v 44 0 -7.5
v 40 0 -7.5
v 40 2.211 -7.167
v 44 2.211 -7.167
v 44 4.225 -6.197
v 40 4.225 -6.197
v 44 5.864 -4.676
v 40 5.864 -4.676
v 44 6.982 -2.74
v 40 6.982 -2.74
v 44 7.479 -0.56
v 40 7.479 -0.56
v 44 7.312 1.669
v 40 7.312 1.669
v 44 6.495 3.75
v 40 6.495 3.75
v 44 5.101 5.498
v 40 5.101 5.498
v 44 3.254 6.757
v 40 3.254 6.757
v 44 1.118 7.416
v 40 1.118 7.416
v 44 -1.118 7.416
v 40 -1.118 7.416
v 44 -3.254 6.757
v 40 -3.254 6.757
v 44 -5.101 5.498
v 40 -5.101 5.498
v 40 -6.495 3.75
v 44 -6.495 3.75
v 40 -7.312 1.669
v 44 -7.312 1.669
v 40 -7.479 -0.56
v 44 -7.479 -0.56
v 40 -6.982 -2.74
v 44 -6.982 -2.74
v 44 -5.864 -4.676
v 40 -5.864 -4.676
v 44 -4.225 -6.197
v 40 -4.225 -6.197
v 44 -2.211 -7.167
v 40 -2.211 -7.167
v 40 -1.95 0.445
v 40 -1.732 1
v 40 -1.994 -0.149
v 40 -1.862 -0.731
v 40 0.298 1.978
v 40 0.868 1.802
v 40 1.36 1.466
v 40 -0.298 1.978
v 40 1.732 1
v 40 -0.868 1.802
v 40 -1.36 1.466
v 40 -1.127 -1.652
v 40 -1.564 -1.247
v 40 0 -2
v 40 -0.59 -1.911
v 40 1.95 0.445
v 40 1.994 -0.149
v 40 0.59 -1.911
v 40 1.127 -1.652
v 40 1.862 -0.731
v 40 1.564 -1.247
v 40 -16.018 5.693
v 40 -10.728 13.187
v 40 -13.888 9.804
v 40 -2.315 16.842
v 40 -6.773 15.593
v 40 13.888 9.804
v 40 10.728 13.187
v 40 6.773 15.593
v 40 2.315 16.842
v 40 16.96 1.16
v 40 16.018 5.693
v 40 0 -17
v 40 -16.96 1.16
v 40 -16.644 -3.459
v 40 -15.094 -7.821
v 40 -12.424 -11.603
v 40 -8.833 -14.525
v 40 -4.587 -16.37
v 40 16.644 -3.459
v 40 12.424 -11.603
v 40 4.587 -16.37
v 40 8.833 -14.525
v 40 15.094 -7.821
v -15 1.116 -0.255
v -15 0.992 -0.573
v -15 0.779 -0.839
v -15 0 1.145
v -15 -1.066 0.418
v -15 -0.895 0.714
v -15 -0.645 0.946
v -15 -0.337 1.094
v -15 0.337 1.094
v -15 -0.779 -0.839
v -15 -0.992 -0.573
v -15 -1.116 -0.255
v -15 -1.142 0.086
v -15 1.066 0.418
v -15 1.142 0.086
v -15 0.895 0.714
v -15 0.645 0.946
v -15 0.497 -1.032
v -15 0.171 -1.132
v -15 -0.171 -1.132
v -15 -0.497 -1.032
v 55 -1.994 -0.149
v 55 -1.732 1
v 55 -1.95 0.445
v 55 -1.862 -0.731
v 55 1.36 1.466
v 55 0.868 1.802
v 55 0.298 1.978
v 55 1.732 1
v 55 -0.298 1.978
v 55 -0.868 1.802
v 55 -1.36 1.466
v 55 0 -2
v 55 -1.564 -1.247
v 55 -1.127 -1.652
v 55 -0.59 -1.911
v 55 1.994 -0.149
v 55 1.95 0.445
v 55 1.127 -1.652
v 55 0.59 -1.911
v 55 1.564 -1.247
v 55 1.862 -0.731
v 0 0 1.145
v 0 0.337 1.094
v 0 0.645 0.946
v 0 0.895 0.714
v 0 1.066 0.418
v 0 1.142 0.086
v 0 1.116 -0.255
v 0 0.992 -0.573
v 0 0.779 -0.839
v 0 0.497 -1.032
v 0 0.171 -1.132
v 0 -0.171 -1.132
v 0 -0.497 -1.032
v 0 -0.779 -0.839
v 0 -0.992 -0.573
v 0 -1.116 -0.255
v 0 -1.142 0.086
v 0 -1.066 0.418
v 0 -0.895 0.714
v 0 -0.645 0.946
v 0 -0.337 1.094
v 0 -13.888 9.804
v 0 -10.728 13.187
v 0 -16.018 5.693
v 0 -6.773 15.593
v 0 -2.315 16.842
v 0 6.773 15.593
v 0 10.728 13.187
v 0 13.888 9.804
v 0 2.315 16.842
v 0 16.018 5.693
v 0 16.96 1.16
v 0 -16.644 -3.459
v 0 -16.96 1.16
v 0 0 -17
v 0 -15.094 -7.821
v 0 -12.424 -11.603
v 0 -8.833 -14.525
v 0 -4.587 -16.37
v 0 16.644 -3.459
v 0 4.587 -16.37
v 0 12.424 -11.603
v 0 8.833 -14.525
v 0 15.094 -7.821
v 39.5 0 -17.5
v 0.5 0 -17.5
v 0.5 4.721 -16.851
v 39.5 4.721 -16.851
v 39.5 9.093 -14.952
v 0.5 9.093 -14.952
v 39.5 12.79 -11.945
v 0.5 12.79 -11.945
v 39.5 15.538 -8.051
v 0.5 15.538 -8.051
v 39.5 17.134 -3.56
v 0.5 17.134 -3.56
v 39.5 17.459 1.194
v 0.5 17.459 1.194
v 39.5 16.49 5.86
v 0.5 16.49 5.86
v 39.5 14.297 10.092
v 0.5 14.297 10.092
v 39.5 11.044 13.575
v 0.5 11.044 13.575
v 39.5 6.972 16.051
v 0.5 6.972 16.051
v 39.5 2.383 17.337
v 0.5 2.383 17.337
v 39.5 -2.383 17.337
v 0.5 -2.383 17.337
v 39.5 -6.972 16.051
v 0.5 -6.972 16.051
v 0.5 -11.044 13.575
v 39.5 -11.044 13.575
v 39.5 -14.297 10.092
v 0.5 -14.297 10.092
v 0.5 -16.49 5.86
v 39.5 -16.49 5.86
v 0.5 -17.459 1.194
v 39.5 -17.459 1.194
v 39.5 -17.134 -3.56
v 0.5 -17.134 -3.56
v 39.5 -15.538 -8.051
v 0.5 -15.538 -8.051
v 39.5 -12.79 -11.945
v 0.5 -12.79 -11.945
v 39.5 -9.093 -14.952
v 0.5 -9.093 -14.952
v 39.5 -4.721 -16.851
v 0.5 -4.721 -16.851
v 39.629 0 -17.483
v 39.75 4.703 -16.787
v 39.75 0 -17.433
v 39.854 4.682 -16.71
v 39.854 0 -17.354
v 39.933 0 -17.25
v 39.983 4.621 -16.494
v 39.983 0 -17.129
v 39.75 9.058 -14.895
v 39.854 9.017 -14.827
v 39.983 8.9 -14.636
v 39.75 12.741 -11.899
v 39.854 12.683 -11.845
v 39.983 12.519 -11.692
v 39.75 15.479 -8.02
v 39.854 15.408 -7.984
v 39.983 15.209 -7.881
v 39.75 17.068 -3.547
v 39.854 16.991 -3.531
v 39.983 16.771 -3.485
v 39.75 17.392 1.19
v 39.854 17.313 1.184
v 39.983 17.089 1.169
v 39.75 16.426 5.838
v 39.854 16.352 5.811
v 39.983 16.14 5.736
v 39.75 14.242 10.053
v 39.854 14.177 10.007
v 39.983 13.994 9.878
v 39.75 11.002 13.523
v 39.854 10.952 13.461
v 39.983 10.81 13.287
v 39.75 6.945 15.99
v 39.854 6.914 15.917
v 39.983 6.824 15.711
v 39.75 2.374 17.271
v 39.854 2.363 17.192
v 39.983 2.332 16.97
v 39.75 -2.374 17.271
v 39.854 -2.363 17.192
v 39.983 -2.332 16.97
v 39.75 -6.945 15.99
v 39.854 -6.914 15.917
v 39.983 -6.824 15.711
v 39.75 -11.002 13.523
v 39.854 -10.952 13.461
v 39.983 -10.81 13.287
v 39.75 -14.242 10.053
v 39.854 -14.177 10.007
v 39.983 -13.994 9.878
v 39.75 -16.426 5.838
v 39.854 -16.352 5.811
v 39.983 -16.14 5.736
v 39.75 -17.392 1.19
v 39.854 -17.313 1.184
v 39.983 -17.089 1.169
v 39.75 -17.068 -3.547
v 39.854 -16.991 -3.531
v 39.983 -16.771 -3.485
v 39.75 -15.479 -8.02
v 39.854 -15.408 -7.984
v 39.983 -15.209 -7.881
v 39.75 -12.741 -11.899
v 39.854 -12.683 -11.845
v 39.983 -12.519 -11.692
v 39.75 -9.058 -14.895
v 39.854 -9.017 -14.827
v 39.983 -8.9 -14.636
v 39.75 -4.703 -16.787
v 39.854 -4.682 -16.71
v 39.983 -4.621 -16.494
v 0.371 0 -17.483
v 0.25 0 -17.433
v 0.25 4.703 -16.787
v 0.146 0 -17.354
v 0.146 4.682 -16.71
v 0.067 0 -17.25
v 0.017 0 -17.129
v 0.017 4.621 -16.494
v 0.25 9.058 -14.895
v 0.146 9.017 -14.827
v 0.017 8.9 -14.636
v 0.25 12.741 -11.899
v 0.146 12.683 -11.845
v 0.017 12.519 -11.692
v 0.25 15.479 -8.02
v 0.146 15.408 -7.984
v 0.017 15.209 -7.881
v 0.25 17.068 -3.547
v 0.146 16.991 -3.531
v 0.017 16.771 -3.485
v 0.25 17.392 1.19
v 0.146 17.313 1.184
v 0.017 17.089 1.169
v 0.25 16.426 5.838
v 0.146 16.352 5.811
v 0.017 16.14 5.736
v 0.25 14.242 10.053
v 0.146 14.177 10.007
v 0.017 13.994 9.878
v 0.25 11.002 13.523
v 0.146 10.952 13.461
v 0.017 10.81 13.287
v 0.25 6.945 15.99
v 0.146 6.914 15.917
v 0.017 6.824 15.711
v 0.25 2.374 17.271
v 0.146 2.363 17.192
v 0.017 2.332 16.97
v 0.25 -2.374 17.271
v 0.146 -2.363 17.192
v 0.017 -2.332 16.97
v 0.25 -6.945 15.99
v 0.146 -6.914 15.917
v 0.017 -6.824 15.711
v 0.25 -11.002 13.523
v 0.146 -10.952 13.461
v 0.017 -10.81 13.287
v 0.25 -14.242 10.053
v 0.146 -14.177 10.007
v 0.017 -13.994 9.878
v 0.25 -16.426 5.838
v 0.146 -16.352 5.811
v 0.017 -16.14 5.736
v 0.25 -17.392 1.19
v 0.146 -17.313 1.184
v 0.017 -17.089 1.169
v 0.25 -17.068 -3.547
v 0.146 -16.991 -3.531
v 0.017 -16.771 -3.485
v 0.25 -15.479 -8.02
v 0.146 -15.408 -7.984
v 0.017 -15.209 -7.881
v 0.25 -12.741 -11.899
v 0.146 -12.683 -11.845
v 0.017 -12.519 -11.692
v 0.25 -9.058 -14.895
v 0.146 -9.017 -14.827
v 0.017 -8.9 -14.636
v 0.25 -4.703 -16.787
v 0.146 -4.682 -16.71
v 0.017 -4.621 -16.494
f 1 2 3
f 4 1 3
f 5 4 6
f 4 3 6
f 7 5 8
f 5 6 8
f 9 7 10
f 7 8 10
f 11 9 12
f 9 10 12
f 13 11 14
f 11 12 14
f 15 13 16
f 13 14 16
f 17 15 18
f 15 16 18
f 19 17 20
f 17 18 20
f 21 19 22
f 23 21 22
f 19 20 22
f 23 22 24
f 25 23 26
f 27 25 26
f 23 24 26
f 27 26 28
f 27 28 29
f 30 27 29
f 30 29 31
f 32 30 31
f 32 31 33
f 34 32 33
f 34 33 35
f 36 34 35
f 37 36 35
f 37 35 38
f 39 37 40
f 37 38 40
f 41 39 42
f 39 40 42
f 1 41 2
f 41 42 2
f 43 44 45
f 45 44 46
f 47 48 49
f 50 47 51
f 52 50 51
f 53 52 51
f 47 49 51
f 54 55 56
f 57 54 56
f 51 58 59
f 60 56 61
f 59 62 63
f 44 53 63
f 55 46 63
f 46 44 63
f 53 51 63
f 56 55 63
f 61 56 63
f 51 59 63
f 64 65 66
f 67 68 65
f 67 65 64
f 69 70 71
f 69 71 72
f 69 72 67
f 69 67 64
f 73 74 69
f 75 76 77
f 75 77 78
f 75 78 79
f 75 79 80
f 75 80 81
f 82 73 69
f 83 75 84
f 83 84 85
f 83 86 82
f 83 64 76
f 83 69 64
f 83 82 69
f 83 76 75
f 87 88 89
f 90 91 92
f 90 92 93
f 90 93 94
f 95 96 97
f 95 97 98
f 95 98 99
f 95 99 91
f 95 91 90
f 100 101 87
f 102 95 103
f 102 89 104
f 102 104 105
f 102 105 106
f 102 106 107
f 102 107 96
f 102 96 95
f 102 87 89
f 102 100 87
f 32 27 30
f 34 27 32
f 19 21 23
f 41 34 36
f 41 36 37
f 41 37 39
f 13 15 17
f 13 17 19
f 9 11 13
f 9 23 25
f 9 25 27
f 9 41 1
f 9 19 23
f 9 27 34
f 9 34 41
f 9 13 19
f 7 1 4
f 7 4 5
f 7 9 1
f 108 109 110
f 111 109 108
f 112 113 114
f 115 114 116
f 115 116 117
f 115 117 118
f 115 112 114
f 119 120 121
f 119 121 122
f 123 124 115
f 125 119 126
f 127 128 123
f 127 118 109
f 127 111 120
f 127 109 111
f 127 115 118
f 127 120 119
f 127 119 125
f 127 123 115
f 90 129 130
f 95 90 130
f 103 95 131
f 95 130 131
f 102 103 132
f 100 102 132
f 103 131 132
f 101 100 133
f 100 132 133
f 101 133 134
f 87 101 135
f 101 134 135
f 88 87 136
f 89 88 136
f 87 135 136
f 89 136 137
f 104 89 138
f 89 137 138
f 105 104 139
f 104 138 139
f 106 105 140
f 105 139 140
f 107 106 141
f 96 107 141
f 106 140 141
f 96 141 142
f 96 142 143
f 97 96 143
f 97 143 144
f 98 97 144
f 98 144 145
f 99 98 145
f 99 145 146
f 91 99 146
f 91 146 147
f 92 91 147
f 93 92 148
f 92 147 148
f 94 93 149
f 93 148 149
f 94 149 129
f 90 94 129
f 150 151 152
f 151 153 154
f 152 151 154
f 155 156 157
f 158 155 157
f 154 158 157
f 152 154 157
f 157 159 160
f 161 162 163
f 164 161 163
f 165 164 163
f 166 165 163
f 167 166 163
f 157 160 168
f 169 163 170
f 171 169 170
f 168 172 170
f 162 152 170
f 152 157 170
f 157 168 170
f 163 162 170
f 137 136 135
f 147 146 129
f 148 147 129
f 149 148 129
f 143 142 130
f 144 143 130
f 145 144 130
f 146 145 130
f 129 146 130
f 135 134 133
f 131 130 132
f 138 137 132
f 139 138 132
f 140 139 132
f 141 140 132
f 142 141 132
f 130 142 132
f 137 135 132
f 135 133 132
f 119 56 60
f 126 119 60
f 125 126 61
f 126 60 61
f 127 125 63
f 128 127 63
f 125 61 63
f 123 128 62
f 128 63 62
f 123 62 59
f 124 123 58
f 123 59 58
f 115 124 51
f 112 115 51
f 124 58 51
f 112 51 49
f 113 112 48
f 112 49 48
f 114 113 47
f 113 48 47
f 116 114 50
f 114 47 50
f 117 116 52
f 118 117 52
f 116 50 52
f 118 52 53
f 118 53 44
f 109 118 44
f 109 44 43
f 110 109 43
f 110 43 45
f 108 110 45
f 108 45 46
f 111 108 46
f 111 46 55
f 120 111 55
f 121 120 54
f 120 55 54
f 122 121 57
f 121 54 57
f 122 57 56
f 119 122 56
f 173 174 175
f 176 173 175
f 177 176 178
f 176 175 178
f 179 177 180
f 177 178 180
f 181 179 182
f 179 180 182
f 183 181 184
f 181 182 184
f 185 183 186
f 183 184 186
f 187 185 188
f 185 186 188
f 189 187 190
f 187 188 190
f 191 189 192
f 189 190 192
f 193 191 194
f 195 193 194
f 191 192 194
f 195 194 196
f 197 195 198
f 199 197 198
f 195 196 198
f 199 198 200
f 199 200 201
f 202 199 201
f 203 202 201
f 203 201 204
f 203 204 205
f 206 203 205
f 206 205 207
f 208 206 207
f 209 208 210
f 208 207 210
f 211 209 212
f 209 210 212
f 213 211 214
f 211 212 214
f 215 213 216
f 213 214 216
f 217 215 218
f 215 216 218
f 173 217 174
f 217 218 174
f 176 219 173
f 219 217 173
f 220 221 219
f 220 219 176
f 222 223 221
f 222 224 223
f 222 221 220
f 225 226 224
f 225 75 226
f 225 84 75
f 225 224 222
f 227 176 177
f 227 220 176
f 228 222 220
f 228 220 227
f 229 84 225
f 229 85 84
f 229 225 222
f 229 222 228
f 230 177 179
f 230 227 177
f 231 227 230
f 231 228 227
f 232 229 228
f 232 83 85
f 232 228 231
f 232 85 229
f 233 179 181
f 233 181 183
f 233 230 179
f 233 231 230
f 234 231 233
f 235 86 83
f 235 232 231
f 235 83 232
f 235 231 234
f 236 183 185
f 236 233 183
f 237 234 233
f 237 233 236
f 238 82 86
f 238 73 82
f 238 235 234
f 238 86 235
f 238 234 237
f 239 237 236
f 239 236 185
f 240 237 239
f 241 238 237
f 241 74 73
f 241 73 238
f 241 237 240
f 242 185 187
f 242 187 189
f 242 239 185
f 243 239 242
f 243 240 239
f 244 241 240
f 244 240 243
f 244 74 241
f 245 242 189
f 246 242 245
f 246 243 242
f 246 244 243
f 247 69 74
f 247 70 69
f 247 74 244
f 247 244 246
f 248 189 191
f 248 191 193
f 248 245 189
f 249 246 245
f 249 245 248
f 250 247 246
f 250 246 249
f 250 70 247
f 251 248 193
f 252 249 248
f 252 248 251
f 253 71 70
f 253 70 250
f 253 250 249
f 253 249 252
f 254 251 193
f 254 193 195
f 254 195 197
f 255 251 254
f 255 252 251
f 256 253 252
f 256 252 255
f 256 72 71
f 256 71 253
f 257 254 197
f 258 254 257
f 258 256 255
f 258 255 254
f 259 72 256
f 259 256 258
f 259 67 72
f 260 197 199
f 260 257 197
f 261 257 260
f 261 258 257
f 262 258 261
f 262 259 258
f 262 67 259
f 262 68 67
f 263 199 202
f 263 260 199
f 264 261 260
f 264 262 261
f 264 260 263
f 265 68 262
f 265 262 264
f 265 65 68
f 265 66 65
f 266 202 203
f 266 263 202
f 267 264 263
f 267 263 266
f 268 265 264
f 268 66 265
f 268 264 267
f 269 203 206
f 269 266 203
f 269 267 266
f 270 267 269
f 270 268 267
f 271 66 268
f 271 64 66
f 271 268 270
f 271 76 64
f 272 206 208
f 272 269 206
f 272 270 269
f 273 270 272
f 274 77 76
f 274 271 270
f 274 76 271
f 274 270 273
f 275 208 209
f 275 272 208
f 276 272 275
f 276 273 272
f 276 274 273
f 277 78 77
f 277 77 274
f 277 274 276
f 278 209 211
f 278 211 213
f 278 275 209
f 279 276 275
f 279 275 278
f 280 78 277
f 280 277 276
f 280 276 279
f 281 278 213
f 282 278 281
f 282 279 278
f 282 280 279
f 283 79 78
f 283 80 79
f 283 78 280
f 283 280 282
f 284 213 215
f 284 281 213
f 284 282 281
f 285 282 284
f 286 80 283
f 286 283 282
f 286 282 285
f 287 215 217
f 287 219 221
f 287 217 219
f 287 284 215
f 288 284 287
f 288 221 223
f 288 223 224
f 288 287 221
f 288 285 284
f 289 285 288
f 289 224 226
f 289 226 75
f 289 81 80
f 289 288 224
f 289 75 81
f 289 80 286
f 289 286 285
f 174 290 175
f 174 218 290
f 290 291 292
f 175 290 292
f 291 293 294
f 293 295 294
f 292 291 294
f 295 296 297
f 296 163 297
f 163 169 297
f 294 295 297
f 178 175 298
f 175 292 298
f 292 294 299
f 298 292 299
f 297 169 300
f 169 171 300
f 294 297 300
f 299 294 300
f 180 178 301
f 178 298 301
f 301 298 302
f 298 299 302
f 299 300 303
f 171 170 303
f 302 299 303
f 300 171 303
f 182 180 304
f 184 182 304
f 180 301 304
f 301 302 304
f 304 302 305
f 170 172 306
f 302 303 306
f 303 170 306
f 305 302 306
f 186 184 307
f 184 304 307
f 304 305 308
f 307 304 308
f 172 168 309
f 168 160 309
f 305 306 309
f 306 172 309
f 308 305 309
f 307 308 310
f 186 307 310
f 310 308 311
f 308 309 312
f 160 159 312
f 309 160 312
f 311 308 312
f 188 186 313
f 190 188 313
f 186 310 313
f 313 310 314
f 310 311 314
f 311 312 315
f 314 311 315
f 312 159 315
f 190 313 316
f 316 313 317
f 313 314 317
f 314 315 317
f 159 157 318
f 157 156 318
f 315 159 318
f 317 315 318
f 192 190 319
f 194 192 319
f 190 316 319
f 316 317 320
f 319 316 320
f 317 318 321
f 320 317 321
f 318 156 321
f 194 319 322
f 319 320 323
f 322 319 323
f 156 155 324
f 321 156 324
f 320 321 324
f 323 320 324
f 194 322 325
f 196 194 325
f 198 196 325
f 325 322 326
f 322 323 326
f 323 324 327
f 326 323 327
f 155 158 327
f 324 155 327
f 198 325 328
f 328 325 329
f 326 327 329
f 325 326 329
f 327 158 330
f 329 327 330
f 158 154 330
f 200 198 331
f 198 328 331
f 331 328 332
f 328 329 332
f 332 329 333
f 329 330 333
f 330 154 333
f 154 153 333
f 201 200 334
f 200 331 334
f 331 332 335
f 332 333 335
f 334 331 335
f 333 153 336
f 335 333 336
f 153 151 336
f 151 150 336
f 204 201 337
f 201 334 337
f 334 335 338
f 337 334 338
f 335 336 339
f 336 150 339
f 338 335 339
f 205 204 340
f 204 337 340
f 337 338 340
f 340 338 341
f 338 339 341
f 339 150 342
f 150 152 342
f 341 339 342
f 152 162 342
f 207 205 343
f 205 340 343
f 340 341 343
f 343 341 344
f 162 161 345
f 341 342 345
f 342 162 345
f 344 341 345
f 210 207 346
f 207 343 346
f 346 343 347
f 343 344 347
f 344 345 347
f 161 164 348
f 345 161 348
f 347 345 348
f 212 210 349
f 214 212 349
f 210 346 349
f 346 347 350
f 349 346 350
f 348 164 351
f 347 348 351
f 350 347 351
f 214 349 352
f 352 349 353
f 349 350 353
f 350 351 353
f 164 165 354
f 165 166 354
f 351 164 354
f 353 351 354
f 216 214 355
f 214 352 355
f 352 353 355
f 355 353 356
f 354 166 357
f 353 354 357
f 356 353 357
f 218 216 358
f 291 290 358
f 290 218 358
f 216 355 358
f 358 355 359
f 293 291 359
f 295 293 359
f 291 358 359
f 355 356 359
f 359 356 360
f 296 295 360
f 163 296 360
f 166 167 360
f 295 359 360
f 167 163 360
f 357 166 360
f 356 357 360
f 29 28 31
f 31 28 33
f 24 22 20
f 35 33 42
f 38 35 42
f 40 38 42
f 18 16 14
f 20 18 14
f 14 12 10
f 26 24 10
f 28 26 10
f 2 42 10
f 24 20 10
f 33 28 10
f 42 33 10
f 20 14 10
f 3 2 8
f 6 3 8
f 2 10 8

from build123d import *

# Parameters (mm, degrees)
CROQUIS1_R              = 17.5
SALIENTE_EXTRUIR1_DEPTH = 40
CROQUIS3_R              = 2
SALIENTE_EXTRUIR2_DEPTH = 15
CROQUIS4_R              = 7.5
SALIENTE_EXTRUIR3_DEPTH = 4
CROQUIS5_R              = 1.145
SALIENTE_EXTRUIR4_DEPTH = 15
REDONDEO1_R             = 0.5
REDONDEO2_R             = 0.5


with BuildPart() as part:
    # Croquis1 → Saliente-Extruir1 (new body)
    with BuildSketch(Plane(origin=(0, 0, 0), x_dir=(0, 0, -1), z_dir=(1, 0, 0))):
        Circle(CROQUIS1_R)
    extrude(amount=SALIENTE_EXTRUIR1_DEPTH)

    # Redondeo1
    redondeo1_edges = [part.edges().sort_by_distance(p)[0] for p in [
        (0, 0, 17.5),
    ]]
    fillet(redondeo1_edges, radius=REDONDEO1_R)

    # Redondeo2
    redondeo2_edges = [part.edges().sort_by_distance(p)[0] for p in [
        (40, 0, 17.5),
    ]]
    fillet(redondeo2_edges, radius=REDONDEO2_R)


with BuildPart() as body_2:
    # Croquis3 → Saliente-Extruir2 (new body)
    with BuildSketch(Plane(origin=(40, 0, 0), x_dir=(0, 0, -1), z_dir=(1, 0, 0))):
        Circle(CROQUIS3_R)
    extrude(amount=SALIENTE_EXTRUIR2_DEPTH)


with BuildPart() as body_3:
    # Croquis4 → Saliente-Extruir3 (new body)
    with BuildSketch(Plane(origin=(40, 0, 0), x_dir=(0, 0, -1), z_dir=(1, 0, 0))):
        Circle(CROQUIS4_R)
    extrude(amount=SALIENTE_EXTRUIR3_DEPTH)


with BuildPart() as body_4:
    # Croquis5 → Saliente-Extruir4 (new body)
    with BuildSketch(Plane.ZY):
        Circle(CROQUIS5_R)
    extrude(amount=SALIENTE_EXTRUIR4_DEPTH)


solid = Compound([part.part, body_2.part, body_3.part, body_4.part])
